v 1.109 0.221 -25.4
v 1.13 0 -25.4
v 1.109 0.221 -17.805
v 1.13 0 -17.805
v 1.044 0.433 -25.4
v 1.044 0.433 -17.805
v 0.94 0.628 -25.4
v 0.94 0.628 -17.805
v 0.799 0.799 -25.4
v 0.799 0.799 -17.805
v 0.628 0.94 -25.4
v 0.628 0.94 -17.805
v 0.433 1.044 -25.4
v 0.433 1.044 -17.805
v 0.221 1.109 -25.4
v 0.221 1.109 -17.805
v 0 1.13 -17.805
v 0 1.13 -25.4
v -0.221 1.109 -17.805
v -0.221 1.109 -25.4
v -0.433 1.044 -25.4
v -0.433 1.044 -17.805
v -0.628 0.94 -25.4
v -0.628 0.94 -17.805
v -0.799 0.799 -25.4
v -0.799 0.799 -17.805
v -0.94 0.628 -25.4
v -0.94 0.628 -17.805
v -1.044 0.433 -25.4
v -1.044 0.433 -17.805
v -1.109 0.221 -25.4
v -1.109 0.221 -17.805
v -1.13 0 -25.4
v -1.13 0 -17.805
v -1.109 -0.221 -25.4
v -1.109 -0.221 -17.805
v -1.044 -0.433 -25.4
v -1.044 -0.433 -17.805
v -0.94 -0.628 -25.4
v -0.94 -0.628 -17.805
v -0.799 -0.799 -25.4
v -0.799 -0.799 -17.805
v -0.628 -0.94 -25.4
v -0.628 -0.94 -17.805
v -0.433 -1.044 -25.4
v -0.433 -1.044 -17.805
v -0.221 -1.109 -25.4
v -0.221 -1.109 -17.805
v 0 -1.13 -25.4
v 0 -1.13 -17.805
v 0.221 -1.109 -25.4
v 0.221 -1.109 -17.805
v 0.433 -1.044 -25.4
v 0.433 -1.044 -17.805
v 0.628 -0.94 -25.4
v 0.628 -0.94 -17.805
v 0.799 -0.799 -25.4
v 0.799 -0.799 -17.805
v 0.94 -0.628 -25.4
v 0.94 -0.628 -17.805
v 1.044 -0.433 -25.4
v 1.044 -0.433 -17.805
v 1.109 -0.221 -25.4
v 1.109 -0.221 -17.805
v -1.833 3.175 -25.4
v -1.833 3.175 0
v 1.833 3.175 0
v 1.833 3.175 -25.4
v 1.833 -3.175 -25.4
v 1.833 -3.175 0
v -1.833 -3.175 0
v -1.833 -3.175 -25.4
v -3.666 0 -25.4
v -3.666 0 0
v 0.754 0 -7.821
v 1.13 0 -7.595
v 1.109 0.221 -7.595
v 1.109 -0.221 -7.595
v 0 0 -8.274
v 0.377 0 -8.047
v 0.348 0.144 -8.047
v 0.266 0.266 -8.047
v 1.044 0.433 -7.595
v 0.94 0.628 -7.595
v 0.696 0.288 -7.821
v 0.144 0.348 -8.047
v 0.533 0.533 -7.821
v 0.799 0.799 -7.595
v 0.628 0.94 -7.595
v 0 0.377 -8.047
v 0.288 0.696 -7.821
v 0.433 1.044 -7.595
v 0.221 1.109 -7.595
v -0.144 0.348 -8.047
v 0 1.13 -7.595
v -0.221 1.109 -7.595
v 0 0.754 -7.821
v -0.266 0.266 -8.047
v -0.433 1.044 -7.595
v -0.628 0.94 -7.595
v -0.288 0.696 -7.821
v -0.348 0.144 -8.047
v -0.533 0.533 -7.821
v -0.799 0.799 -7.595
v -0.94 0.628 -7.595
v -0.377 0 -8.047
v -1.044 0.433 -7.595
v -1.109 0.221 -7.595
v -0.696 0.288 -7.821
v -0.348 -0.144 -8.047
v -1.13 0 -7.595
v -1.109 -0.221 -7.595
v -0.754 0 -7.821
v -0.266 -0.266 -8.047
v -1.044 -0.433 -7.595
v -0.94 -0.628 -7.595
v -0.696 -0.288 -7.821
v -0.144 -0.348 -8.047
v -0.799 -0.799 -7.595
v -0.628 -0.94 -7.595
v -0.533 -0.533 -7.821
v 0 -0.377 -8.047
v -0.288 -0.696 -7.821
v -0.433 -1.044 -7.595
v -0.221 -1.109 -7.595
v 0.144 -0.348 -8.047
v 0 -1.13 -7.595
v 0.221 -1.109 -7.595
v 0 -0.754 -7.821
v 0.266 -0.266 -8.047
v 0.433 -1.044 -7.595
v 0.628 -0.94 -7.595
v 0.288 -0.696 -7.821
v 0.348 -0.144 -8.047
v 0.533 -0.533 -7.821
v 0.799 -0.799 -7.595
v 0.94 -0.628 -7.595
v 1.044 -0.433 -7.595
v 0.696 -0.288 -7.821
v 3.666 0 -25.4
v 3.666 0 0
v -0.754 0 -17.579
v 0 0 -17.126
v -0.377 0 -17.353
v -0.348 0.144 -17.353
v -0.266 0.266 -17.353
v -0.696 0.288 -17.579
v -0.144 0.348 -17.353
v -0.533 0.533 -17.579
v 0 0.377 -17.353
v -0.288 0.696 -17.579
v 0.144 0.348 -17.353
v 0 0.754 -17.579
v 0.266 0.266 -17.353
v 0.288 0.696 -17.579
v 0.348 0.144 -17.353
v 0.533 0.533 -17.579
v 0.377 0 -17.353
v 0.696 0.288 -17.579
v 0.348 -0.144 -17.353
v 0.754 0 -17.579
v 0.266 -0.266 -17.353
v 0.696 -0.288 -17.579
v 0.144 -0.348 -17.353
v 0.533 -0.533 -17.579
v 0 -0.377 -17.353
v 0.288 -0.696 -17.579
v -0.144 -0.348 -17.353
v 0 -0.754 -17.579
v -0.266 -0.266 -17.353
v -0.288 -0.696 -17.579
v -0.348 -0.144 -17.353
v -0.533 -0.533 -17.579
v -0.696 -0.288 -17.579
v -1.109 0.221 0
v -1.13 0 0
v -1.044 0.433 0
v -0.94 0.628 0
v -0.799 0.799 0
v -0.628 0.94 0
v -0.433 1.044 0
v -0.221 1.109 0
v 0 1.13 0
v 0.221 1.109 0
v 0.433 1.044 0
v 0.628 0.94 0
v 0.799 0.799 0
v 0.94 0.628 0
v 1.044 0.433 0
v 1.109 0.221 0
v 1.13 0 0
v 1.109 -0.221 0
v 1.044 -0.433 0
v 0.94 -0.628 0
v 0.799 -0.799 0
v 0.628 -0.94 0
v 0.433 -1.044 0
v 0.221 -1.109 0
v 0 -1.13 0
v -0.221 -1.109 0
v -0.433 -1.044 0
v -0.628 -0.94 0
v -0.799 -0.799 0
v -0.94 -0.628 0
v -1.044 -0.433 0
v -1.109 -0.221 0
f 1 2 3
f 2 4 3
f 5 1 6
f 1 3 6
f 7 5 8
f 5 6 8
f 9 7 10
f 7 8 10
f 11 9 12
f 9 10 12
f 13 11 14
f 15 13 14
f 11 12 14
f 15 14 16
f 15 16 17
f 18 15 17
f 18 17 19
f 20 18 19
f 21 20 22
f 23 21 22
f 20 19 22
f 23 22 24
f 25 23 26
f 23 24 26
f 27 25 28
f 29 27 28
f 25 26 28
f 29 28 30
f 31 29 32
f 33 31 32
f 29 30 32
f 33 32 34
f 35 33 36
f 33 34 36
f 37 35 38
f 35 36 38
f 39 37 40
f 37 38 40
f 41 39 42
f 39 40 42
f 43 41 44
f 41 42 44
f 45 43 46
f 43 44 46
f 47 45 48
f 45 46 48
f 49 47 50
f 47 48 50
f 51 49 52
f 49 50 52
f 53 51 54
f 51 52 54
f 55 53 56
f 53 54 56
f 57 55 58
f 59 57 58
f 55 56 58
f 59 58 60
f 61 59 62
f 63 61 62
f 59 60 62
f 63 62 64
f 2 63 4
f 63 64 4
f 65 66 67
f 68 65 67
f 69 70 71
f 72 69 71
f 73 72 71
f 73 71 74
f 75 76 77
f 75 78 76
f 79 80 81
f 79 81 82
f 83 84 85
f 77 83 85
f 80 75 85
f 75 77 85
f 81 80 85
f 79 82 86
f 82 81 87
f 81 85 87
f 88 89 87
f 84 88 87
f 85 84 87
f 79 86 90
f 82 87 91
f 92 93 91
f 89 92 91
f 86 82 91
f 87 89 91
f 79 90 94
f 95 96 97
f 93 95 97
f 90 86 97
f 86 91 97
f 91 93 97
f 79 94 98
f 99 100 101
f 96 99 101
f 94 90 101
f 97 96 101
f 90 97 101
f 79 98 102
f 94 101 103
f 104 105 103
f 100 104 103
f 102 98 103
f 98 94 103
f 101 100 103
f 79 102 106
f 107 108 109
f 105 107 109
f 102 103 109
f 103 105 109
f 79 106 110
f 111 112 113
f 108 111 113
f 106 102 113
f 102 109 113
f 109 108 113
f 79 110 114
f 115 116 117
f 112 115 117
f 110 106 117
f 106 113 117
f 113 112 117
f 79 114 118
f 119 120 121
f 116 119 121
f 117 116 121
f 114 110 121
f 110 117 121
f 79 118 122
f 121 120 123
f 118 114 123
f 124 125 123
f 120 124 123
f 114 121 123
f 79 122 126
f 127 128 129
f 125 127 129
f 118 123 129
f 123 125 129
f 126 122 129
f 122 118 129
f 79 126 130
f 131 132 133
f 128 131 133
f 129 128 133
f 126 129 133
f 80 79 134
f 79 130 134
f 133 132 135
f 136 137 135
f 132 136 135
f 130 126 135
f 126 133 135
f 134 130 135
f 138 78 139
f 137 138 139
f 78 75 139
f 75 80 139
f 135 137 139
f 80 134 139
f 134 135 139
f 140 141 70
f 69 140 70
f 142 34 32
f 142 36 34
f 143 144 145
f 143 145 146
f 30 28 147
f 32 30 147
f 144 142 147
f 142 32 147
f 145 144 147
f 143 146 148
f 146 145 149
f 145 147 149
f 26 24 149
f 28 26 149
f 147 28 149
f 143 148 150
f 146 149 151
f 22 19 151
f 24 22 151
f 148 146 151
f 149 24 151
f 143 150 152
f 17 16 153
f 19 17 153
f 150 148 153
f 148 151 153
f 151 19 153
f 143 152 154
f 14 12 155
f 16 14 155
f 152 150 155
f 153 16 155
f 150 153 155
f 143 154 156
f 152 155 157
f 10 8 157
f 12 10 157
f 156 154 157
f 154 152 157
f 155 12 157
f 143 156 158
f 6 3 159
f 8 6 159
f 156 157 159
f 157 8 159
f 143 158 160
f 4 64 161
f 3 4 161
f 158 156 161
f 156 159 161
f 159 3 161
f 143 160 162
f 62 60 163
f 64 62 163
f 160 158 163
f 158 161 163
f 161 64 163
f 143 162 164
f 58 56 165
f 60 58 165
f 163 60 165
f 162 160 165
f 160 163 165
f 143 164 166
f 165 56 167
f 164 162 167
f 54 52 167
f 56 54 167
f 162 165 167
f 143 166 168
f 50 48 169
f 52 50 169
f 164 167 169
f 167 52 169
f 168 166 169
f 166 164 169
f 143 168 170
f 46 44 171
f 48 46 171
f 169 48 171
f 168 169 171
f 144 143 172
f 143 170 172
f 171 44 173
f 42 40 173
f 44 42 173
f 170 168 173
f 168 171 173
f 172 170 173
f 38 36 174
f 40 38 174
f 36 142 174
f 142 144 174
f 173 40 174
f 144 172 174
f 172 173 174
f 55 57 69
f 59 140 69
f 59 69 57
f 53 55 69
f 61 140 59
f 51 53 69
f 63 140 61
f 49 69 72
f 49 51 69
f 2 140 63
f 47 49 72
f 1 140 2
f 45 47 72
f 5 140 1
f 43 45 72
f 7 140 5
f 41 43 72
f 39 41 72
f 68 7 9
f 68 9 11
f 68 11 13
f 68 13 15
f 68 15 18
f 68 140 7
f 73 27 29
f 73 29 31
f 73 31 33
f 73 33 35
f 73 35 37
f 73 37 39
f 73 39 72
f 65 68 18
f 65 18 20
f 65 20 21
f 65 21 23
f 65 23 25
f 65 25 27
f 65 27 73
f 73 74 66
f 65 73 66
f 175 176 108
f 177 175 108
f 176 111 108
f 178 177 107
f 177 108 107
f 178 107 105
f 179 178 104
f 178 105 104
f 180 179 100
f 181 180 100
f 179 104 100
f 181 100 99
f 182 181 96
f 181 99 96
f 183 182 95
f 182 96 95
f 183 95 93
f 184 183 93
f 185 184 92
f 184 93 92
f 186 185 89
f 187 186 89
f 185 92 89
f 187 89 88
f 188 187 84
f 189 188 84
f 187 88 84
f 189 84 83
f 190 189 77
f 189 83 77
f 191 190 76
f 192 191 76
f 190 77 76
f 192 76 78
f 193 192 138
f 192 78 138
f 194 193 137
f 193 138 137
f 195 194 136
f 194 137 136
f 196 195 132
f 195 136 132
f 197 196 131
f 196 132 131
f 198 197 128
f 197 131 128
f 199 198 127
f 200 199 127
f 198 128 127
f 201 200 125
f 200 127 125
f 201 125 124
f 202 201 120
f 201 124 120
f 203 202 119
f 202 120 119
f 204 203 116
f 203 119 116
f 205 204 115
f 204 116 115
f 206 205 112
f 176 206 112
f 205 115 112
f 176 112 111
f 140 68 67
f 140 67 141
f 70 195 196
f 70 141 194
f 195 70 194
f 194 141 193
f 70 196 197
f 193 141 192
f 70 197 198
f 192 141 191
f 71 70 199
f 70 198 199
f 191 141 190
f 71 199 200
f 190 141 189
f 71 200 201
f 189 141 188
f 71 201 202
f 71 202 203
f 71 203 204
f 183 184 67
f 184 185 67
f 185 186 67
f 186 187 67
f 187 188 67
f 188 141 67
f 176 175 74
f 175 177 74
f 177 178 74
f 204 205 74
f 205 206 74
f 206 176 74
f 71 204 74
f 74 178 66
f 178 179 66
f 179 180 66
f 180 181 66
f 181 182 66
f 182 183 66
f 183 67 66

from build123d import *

# Parameters (mm, degrees)
EXTRUDE1_DEPTH            = 25.4
F_4_40_TAPPED_HOLE1_D     = 2.2606
F_4_40_TAPPED_HOLE1_DEPTH = 7.5946
F_4_40_TAPPED_HOLE1_TIP   = 0.679152758
F_4_40_TAPPED_HOLE2_D     = 2.2606
F_4_40_TAPPED_HOLE2_DEPTH = 7.5946
F_4_40_TAPPED_HOLE2_TIP   = 0.679152758


with BuildPart() as part:
    # Sketch2 → Extrude1 (new body)
    with BuildSketch(Plane.XY):
        Polygon((-1.833087105, 3.175), (1.833087105, 3.175), (3.666174209, 0), (1.833087105, -3.175), (-1.833087105, -3.175), (-3.666174209, 0), align=None)
    extrude(amount=-EXTRUDE1_DEPTH)

    # #4-40 Tapped Hole1
    with Locations(Plane.XY):
        with Locations((0, 0)):
            Hole(F_4_40_TAPPED_HOLE1_D / 2, depth=F_4_40_TAPPED_HOLE1_DEPTH)
            with Locations((0, 0, -(F_4_40_TAPPED_HOLE1_DEPTH + F_4_40_TAPPED_HOLE1_TIP / 2))):  # 118° drill point
                Cone(0, F_4_40_TAPPED_HOLE1_D / 2, F_4_40_TAPPED_HOLE1_TIP, mode=Mode.SUBTRACT)

    # #4-40 Tapped Hole2
    with Locations(Plane(origin=(0, 0, -25.4), x_dir=(-1, 0, 0), z_dir=(0, 0, -1))):
        with Locations((0, 0)):
            Hole(F_4_40_TAPPED_HOLE2_D / 2, depth=F_4_40_TAPPED_HOLE2_DEPTH)
            with Locations((0, 0, -(F_4_40_TAPPED_HOLE2_DEPTH + F_4_40_TAPPED_HOLE2_TIP / 2))):  # 118° drill point
                Cone(0, F_4_40_TAPPED_HOLE2_D / 2, F_4_40_TAPPED_HOLE2_TIP, mode=Mode.SUBTRACT)


solid = part.part
